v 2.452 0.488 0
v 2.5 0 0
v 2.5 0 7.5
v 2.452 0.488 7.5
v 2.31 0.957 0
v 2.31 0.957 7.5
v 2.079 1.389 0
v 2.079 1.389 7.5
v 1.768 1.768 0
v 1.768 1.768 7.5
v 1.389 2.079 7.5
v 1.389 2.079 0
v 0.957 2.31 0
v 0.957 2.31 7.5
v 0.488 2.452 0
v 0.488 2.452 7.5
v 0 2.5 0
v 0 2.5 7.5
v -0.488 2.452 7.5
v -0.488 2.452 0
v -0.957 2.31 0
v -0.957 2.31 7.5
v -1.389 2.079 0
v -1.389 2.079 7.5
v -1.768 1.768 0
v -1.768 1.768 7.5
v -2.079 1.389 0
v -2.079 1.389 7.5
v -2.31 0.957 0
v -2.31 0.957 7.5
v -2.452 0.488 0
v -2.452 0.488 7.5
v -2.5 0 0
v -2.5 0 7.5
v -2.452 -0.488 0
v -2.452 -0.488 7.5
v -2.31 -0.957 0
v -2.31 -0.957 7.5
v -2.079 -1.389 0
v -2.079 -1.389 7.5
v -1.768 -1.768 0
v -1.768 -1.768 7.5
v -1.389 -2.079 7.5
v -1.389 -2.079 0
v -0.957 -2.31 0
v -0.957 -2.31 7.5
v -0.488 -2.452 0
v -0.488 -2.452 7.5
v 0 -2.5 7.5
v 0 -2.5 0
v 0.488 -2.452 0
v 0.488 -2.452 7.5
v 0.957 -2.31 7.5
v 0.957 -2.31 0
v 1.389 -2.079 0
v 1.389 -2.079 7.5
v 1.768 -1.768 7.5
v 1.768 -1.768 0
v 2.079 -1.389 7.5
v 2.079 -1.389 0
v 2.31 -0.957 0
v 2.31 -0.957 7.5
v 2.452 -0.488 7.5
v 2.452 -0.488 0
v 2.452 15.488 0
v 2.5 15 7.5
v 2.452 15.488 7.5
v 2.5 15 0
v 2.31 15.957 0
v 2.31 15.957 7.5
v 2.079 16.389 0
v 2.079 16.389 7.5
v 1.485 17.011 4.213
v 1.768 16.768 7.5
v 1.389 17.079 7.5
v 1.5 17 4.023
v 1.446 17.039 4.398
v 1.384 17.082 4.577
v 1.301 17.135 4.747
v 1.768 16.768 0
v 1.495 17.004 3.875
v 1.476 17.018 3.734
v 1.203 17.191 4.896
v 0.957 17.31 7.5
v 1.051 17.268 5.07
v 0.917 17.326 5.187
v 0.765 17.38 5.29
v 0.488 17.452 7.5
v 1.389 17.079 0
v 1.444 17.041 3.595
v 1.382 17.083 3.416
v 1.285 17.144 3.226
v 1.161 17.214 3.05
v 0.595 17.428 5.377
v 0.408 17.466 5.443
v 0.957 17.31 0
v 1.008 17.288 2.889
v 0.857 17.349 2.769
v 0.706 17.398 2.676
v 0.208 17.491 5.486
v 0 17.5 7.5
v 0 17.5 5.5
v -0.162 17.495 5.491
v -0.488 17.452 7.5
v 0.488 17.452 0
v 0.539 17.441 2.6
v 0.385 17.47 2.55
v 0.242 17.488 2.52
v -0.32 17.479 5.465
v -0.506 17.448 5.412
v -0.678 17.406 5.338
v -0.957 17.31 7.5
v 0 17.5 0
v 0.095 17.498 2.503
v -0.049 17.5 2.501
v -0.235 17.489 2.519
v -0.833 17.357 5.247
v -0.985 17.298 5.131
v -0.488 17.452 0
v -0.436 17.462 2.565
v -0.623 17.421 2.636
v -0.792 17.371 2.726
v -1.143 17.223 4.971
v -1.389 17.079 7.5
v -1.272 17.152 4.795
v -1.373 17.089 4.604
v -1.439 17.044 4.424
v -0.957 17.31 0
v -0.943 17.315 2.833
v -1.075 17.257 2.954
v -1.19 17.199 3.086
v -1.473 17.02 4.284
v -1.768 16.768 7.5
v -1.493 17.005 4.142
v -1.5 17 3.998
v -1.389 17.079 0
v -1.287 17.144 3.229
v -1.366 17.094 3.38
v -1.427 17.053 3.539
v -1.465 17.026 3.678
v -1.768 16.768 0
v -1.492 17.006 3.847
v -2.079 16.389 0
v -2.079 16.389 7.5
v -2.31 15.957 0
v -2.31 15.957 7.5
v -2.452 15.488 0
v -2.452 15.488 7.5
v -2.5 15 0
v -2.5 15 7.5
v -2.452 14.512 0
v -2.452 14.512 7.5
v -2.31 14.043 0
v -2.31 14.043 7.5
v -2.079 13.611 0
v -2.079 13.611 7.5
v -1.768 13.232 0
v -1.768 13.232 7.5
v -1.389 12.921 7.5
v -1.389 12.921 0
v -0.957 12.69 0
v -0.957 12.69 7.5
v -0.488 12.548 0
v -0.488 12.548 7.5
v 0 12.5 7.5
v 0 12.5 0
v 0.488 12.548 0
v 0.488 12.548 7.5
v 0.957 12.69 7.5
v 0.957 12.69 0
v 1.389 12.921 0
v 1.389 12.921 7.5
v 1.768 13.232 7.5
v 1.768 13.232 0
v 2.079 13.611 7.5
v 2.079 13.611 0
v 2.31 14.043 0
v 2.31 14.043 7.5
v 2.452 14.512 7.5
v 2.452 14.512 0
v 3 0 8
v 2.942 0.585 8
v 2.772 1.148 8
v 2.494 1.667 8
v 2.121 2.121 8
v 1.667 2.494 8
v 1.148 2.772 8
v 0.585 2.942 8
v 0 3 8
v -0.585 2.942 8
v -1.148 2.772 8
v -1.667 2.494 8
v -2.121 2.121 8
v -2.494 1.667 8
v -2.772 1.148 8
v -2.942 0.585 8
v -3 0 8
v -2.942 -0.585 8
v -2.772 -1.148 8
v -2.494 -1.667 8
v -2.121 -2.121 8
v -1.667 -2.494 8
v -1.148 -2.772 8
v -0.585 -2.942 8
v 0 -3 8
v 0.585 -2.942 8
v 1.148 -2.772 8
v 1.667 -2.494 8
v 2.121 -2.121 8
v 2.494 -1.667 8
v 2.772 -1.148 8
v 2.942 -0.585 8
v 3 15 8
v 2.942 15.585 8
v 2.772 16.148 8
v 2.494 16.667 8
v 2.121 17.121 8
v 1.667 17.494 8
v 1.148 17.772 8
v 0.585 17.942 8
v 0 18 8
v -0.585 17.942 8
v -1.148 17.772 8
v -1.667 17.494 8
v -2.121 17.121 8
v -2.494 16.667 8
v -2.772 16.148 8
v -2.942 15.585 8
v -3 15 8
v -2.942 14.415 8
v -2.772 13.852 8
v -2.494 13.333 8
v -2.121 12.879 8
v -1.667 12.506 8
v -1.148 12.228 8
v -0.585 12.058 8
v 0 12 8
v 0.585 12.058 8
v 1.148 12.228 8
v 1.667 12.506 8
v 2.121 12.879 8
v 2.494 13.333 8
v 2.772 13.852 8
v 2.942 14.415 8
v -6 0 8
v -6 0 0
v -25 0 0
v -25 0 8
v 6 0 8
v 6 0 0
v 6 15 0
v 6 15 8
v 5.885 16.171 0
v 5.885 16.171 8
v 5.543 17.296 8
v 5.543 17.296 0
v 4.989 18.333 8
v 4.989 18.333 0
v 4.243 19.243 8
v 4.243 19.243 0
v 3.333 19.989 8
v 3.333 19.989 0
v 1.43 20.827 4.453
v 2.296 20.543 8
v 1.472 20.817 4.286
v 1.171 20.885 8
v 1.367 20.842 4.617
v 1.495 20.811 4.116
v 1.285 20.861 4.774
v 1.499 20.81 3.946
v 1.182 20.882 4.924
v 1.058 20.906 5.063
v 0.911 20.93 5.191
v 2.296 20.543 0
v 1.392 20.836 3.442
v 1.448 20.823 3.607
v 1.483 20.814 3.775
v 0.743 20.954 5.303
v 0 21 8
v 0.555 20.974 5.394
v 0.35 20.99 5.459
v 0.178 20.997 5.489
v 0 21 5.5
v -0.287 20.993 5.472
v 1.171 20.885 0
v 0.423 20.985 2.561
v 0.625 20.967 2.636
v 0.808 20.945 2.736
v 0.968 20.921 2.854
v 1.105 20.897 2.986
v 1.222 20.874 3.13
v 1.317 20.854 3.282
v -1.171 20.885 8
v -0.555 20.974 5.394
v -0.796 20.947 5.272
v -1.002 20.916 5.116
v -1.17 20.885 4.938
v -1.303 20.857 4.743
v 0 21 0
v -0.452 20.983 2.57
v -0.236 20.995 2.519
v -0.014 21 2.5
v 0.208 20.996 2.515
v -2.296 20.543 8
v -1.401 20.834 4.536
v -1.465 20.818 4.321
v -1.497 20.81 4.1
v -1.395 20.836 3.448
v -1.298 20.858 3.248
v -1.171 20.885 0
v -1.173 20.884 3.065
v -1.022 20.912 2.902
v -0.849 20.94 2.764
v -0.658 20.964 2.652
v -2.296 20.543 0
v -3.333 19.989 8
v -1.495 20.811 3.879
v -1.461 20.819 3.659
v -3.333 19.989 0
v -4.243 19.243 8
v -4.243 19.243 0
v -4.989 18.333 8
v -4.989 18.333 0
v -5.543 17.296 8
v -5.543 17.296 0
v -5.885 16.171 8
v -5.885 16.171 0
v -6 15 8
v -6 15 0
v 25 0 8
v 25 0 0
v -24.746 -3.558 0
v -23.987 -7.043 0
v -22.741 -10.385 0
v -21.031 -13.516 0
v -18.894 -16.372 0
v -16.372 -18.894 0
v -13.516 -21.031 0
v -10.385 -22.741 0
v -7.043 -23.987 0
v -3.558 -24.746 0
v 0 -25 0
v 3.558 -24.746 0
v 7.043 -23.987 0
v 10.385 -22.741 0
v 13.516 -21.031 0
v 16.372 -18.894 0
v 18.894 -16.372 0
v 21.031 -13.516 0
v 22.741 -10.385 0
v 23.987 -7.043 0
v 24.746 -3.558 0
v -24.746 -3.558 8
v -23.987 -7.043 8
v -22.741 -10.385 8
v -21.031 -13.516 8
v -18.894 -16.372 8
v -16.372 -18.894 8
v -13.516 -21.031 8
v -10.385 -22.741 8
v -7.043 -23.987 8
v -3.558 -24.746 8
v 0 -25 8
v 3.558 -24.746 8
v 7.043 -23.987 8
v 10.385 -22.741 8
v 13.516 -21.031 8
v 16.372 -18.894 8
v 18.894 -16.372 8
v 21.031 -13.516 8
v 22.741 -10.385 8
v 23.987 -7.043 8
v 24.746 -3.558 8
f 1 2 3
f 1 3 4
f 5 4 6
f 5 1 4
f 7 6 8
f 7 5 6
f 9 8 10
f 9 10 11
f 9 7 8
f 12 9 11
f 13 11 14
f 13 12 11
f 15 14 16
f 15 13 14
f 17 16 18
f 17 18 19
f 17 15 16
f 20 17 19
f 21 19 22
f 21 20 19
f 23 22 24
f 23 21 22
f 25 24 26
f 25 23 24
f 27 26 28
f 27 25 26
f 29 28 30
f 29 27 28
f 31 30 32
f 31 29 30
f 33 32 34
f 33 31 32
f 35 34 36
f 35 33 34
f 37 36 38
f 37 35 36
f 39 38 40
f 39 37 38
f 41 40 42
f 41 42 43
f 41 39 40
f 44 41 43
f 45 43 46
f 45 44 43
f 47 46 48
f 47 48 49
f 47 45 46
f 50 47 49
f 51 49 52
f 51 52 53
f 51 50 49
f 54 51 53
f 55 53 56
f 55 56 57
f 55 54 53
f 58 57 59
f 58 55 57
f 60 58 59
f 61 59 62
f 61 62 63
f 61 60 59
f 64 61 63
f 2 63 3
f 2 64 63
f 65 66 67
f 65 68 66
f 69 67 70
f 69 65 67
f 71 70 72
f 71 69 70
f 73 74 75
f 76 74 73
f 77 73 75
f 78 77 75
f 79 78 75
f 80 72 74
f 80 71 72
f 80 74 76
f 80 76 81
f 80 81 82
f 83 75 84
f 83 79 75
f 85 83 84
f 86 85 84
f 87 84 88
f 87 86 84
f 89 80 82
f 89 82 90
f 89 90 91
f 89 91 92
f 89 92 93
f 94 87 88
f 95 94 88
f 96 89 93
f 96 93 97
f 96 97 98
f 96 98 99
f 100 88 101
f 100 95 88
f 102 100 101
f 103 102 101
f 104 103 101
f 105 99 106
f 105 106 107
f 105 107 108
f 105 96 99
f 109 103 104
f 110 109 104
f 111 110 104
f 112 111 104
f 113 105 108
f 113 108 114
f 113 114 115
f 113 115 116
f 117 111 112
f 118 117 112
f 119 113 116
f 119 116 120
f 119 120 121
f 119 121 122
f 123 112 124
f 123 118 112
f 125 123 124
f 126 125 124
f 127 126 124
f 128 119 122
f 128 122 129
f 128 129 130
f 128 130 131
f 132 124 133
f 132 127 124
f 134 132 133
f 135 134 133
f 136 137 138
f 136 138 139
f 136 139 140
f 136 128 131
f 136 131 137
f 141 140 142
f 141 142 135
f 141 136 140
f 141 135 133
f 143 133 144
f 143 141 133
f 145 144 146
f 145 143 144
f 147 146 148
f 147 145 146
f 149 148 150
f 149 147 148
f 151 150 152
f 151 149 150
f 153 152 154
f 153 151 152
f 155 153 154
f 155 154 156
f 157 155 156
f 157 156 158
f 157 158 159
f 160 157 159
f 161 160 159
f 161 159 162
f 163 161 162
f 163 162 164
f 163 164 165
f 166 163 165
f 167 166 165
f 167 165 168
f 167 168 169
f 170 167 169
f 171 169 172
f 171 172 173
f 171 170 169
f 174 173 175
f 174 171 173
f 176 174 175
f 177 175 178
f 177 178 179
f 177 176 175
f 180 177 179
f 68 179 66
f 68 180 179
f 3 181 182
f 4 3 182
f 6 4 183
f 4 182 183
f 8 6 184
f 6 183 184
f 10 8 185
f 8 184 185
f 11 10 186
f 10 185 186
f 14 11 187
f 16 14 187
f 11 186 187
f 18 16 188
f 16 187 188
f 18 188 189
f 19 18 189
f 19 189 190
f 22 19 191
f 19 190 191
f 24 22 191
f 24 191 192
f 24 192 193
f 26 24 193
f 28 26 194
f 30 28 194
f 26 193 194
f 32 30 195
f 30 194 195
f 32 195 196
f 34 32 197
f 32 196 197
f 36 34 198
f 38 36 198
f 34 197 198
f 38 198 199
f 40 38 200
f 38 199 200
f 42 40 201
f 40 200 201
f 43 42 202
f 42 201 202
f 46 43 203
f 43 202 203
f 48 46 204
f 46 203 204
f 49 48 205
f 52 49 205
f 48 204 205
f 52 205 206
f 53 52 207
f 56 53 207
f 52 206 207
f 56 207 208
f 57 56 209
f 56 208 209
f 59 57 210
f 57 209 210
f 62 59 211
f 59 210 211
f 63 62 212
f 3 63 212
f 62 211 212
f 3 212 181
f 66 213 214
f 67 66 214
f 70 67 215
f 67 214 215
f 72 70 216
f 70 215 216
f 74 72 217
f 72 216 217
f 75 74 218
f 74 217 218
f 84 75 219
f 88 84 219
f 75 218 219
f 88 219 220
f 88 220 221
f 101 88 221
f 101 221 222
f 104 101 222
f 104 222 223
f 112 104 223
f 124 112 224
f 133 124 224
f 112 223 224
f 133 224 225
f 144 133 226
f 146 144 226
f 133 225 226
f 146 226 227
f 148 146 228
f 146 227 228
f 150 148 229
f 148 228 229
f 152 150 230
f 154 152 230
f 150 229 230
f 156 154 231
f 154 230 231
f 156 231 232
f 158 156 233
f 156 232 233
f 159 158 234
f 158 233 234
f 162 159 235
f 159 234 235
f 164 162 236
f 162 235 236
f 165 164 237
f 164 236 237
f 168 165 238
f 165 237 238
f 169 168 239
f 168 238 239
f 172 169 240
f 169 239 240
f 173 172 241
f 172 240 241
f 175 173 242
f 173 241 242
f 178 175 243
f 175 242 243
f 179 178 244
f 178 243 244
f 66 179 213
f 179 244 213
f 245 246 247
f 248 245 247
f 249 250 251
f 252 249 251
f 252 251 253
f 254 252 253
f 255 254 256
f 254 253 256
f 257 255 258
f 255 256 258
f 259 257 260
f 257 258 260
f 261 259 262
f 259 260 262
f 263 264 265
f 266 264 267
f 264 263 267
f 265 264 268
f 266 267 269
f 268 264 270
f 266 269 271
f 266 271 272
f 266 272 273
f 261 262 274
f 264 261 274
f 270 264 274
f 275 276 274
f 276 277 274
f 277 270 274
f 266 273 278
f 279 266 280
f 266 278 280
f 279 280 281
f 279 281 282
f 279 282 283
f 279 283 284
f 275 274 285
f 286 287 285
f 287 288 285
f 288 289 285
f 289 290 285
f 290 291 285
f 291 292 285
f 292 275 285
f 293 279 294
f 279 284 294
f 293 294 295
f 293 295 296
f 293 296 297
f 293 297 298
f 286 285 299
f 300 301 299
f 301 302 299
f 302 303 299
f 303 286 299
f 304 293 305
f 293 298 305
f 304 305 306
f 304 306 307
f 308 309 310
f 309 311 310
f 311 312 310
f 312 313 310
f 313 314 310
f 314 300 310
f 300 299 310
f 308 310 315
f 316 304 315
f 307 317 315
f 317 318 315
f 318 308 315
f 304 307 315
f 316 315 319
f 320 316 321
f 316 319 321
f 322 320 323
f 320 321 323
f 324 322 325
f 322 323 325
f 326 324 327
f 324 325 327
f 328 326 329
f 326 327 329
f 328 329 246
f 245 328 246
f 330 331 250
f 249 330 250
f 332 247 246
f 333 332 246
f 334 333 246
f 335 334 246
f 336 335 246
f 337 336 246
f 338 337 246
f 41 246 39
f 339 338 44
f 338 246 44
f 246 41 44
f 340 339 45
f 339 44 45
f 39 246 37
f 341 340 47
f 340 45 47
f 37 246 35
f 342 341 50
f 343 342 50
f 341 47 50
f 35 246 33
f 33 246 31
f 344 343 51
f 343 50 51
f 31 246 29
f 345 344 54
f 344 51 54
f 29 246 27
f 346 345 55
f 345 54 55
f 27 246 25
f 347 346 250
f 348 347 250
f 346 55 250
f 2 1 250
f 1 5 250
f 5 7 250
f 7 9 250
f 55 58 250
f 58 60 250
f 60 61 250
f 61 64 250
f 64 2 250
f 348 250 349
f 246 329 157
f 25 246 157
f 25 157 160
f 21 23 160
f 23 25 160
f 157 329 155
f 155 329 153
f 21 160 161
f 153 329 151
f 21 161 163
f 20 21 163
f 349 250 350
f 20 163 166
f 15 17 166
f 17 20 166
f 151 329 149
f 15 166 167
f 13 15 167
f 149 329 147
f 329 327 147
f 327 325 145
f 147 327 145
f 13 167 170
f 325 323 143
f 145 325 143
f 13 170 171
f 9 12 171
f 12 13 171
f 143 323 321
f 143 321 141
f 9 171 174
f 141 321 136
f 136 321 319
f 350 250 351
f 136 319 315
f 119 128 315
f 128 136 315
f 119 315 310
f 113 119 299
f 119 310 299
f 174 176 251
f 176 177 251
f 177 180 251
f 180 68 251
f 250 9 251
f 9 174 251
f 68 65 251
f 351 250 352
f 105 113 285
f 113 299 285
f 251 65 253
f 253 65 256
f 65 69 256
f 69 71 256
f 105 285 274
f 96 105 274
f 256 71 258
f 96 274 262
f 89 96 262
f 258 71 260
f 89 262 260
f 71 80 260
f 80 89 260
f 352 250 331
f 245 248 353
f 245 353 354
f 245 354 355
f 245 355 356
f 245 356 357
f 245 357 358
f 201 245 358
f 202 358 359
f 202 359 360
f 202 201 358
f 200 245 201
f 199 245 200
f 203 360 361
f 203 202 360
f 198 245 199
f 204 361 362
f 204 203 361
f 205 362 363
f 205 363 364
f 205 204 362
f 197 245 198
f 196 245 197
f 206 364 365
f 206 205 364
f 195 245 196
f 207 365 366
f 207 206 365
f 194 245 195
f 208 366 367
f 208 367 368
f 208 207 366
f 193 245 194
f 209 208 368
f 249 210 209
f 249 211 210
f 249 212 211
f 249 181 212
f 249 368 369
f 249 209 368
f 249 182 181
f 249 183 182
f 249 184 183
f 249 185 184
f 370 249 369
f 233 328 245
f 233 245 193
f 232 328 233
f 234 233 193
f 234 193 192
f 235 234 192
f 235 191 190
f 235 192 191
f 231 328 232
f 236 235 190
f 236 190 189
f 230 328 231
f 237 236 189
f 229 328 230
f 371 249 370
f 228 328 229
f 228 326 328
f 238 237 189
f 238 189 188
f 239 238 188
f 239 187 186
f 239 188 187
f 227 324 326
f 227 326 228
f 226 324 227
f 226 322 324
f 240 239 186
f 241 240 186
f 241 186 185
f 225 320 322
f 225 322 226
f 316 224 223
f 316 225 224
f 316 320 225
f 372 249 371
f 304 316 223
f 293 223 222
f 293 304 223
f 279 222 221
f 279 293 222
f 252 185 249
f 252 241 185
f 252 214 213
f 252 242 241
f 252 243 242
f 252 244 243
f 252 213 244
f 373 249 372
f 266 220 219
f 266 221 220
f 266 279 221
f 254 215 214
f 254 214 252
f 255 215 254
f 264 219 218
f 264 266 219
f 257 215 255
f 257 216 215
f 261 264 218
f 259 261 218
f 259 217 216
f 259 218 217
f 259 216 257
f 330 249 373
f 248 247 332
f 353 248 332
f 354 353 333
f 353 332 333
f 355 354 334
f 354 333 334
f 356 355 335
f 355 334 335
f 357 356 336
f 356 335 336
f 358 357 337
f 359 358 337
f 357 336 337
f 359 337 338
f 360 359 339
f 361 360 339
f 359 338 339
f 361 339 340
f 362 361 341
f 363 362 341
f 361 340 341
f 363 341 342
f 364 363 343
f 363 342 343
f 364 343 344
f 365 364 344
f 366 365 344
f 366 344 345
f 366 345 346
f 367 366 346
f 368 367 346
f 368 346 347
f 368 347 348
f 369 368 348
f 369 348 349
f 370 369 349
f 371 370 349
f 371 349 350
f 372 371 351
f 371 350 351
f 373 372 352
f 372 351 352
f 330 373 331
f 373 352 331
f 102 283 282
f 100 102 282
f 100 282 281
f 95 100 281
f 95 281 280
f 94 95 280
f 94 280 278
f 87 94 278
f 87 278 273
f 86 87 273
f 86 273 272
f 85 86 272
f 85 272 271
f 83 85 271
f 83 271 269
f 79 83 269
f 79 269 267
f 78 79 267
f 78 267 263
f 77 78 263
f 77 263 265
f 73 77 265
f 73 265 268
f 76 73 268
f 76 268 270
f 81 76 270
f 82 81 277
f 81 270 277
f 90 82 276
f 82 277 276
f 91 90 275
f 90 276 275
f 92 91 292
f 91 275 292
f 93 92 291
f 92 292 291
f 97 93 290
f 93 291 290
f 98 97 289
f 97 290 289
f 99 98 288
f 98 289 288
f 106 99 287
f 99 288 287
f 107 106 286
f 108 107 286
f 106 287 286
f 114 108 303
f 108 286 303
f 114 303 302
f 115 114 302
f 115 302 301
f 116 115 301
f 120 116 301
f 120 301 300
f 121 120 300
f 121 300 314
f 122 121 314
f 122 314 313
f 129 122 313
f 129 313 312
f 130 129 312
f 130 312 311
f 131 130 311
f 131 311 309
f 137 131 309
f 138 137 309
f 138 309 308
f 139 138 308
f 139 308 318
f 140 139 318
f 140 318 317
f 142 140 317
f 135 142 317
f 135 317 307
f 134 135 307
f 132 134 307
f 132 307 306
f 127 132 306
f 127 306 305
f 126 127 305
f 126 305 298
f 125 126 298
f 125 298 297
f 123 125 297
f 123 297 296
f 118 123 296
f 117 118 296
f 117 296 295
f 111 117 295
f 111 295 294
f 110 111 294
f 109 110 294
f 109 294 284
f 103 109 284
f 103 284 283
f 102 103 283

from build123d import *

# Parameters (mm, degrees)
SKETCH1_R           = 2.5
BOSS_EXTRUDE1_DEPTH = 8
CHAMFER1_SIZE       = 0.5
SKETCH2_R           = 1.5
CUT_EXTRUDE1_DEPTH  = 5


with BuildPart() as part:
    # Sketch1 → Boss-Extrude1 (new body)
    with BuildSketch(Plane.XY):
        with BuildLine():
            Line((-6, 15), (-6, 0))
            Line((-6, 0), (-25, 0))
            ThreePointArc((-25, 0), (0, -25), (25, 0))
            Line((25, 0), (6, 0))
            Line((6, 0), (6, 15))
            ThreePointArc((6, 15), (0, 21), (-6, 15))
        make_face()
        with Locations((0, 15)):
            Circle(SKETCH1_R, mode=Mode.SUBTRACT)
        Circle(SKETCH1_R, mode=Mode.SUBTRACT)
    extrude(amount=BOSS_EXTRUDE1_DEPTH)

    # Chamfer1
    chamfer1_edges = [part.edges().sort_by_distance(p)[0] for p in [
        (-2.5, 15, 8),
        (-2.5, 0, 8),
    ]]
    chamfer(chamfer1_edges, length=CHAMFER1_SIZE)

    # Sketch2 → Cut-Extrude1 (cut)
    with BuildSketch(Plane(origin=(0, 21, 0), x_dir=(1, 0, 0), z_dir=(0, 1, 0))):
        with Locations(Location((0, -4, 0), (0, 0, 270))):
            Circle(SKETCH2_R)
    extrude(amount=-CUT_EXTRUDE1_DEPTH, mode=Mode.SUBTRACT)


solid = part.part
